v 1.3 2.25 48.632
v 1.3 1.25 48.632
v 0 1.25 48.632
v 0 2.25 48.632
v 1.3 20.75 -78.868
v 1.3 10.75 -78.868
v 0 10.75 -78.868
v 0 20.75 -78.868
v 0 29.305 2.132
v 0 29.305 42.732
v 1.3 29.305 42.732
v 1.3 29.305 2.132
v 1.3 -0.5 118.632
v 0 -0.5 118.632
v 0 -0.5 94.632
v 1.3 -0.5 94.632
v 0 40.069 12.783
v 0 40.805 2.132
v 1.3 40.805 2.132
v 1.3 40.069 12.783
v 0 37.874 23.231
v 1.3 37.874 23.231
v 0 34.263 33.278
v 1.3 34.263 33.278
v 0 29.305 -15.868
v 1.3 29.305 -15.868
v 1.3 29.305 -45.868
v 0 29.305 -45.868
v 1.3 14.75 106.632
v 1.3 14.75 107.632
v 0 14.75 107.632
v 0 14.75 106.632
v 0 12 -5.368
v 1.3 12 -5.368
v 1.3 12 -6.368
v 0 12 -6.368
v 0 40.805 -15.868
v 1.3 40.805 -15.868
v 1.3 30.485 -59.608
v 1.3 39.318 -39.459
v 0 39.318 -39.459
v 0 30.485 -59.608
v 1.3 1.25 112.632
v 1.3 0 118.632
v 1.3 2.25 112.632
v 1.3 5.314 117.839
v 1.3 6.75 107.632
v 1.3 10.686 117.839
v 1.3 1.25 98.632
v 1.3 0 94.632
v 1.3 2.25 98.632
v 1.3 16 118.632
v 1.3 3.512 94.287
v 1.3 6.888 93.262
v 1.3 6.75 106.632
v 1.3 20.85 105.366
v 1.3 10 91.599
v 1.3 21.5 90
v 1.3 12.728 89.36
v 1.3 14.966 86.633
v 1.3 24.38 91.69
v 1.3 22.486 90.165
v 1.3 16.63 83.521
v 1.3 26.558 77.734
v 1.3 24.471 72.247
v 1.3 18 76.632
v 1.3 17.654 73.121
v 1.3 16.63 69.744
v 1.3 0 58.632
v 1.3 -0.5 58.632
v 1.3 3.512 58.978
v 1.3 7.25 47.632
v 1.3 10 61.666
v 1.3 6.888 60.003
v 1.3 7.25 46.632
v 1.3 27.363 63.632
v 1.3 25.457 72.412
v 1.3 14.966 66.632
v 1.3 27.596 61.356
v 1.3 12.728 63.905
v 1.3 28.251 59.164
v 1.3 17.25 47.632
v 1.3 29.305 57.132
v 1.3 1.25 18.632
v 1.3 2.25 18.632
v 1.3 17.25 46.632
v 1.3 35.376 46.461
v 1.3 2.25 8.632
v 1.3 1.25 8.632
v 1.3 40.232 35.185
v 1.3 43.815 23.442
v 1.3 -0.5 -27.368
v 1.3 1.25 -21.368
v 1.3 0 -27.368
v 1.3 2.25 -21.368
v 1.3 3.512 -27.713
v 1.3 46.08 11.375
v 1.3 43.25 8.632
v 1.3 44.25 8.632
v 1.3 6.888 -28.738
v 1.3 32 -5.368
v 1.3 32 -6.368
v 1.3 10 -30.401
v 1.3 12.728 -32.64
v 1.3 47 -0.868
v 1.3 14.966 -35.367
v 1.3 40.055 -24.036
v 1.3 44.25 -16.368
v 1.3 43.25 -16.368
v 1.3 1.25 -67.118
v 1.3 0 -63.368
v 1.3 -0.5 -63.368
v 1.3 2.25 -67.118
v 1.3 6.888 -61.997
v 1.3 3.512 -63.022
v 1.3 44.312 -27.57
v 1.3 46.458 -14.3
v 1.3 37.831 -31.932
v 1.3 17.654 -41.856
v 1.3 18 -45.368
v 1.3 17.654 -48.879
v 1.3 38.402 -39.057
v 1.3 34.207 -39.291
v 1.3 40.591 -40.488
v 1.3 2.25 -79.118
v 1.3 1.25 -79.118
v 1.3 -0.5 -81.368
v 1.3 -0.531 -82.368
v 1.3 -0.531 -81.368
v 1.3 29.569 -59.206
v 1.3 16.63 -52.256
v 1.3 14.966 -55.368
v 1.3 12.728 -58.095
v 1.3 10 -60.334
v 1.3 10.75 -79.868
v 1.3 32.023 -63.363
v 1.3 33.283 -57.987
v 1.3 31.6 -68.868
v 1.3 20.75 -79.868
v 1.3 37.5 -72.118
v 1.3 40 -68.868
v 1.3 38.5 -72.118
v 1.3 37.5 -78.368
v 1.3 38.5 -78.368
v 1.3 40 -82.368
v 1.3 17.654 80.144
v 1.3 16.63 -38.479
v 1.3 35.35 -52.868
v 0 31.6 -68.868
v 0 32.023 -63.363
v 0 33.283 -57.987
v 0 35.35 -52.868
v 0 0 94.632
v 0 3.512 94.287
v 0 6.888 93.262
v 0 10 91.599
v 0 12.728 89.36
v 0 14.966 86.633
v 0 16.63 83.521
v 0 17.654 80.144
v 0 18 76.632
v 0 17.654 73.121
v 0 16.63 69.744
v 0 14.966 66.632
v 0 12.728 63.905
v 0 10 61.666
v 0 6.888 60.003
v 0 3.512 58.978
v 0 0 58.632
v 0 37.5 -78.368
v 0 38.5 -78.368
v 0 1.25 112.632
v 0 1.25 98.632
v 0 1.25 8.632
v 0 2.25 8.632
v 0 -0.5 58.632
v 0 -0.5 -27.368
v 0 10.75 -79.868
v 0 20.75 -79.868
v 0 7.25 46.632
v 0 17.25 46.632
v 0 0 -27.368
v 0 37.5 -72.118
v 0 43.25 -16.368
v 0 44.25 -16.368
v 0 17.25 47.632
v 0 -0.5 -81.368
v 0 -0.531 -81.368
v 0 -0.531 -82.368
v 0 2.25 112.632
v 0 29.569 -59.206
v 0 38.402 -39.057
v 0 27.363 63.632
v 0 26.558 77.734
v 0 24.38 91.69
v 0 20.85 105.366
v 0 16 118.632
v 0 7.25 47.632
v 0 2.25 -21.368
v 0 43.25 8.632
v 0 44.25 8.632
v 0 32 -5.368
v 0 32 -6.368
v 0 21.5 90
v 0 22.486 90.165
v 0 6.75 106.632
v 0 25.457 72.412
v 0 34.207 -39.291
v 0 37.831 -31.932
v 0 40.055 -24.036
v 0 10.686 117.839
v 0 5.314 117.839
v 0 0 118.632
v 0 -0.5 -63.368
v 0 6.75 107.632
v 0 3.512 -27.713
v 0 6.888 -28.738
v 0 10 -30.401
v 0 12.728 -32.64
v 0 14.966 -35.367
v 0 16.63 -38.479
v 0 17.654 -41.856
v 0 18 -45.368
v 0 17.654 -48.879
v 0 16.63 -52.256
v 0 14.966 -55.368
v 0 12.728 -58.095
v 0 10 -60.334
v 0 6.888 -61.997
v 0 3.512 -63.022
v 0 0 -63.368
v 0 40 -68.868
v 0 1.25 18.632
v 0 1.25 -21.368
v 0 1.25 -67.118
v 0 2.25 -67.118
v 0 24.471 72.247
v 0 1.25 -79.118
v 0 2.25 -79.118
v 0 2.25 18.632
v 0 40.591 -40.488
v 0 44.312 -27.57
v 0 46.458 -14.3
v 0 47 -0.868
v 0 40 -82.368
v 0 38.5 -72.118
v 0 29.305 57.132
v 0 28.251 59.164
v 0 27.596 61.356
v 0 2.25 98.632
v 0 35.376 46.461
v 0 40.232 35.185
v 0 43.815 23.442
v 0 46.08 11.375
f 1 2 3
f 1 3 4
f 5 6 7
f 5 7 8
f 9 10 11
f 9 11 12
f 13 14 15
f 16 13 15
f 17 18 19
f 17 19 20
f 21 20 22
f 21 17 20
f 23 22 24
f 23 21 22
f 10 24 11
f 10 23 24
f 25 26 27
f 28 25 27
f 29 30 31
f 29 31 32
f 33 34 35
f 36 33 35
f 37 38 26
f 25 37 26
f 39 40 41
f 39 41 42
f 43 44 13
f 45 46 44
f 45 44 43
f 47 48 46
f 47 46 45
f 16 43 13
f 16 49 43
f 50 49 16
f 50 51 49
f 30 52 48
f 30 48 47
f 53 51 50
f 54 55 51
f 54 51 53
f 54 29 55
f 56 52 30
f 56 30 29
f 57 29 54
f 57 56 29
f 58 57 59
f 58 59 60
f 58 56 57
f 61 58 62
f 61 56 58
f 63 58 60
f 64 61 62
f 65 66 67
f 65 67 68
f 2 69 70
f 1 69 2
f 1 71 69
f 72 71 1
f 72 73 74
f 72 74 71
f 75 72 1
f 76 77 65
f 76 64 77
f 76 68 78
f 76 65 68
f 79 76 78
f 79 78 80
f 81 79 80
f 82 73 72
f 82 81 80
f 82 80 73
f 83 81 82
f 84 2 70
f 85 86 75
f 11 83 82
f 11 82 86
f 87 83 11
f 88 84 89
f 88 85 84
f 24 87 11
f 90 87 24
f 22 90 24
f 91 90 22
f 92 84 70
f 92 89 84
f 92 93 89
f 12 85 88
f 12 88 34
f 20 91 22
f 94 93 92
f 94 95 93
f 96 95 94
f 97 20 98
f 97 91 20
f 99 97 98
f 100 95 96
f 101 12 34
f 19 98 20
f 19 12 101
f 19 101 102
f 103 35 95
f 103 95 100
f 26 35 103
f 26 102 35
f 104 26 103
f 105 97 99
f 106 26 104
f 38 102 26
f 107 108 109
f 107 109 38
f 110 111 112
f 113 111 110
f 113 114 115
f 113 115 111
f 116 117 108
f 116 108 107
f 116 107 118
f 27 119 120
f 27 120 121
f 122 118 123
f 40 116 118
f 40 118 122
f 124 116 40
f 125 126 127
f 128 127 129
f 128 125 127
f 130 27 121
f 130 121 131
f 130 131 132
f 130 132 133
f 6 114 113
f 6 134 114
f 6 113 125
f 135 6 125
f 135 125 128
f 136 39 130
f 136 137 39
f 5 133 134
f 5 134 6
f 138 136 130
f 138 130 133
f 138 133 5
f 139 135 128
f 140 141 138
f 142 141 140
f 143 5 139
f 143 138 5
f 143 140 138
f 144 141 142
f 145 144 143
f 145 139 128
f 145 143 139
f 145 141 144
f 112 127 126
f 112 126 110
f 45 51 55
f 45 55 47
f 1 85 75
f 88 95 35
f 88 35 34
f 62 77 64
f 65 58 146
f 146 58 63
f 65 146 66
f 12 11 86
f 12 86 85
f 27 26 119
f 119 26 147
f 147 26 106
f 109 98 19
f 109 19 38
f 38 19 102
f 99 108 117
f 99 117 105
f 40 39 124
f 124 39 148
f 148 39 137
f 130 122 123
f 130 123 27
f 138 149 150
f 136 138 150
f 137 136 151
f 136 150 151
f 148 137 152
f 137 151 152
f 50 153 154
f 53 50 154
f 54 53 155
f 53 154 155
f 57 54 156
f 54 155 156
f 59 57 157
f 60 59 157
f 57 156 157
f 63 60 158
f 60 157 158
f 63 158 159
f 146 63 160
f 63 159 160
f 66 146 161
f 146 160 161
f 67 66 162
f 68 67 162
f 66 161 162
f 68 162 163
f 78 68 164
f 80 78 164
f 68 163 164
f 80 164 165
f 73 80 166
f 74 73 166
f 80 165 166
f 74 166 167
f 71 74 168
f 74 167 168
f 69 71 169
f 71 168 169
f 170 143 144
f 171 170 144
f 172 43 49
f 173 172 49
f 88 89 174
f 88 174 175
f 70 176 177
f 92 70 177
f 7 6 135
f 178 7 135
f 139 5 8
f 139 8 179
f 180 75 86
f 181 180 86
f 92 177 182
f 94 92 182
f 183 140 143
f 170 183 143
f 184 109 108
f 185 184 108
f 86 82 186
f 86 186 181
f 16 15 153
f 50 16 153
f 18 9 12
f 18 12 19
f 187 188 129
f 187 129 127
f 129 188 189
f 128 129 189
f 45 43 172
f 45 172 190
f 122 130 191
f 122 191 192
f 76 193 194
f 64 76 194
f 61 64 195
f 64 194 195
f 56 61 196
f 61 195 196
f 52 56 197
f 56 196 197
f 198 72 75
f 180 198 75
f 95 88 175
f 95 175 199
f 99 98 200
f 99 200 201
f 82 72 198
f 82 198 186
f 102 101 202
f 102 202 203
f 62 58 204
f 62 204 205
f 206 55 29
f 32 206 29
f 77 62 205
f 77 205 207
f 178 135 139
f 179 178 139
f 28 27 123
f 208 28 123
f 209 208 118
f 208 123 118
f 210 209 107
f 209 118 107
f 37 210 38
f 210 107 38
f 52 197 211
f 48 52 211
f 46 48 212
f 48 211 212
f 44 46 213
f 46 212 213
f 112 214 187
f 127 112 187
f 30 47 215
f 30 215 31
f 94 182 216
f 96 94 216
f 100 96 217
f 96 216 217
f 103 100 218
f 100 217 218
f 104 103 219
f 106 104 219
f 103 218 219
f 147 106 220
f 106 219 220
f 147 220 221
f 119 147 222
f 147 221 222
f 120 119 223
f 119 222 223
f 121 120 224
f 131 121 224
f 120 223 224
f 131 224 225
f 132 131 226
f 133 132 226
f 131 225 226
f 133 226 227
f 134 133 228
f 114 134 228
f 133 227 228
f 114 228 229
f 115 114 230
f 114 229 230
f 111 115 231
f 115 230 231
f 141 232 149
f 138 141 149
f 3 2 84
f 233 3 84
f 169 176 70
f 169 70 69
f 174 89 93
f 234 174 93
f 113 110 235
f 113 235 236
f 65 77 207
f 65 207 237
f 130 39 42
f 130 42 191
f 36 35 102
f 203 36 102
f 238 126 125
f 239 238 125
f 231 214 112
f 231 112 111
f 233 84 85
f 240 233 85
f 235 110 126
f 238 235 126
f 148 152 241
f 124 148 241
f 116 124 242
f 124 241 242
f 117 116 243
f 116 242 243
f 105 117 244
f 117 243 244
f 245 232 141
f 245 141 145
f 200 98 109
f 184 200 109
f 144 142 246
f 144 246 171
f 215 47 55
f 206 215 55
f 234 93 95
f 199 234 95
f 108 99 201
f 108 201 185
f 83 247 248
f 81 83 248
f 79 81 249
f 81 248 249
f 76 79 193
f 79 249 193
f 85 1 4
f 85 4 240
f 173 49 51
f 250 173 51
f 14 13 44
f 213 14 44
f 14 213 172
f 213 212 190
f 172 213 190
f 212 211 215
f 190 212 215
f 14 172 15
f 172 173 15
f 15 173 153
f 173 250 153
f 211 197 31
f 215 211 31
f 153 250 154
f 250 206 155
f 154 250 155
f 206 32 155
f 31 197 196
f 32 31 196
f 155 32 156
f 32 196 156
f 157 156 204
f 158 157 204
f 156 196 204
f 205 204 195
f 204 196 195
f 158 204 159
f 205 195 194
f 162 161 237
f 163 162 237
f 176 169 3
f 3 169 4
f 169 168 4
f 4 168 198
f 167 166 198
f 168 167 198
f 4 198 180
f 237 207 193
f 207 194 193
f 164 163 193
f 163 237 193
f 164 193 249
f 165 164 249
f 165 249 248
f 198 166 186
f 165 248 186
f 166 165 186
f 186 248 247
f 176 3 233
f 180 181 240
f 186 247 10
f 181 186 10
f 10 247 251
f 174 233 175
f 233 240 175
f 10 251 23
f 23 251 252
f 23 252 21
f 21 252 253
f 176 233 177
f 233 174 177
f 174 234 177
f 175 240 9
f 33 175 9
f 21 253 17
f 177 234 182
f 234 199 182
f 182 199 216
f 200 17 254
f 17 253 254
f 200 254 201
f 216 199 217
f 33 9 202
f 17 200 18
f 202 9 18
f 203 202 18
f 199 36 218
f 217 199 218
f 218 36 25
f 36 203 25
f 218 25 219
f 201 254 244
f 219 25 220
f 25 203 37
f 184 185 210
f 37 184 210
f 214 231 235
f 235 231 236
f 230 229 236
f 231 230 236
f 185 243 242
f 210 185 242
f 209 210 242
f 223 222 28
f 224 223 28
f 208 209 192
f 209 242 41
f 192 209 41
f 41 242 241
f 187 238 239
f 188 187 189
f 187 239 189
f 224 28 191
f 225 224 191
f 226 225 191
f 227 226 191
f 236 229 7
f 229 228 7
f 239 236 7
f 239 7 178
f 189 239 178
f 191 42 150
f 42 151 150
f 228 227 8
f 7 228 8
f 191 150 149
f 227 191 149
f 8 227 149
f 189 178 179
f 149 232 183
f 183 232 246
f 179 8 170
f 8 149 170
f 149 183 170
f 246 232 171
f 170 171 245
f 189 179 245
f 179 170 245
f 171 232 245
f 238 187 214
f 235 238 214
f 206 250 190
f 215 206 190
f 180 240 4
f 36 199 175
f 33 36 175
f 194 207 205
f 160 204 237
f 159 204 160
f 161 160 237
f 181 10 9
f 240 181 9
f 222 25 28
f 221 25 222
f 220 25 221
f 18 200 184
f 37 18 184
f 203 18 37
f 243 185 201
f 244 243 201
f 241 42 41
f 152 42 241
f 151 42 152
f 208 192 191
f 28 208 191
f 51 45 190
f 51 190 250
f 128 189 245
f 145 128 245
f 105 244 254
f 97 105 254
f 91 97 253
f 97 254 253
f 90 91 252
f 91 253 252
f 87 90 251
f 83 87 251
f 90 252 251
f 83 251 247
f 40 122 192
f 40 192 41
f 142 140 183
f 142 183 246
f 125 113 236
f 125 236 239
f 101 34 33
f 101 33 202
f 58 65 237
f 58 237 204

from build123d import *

# Parameters (mm, degrees)
BOSS_EXTRUDE1_DEPTH = 1.3
SKETCH2_W           = 6.25
SKETCH2_H           = 1
CUT_EXTRUDE1_DEPTH  = 128.618193671
SKETCH3_W           = 12
SKETCH3_H           = 1
SKETCH3_W_2         = 30
SKETCH3_W_3         = 14
SKETCH3_W_4         = 1
SKETCH3_H_2         = 8
CUT_EXTRUDE2_DEPTH  = 128.618193671
SKETCH4_W           = 1
SKETCH4_H           = 10
CUT_EXTRUDE3_DEPTH  = 128.618193671
SKETCH5_W           = 25
SKETCH5_H           = 1
SKETCH5_W_2         = 1
SKETCH5_H_2         = 20
CUT_EXTRUDE4_DEPTH  = 128.618193671
SKETCH6_W           = 1
SKETCH6_H           = 10
CUT_EXTRUDE5_DEPTH  = 128.618193671
SKETCH7_W           = 24
SKETCH7_H           = 0.5
SKETCH7_W_2         = 86
SKETCH7_W_3         = 18
BOSS_EXTRUDE2_DEPTH = 1.3
CUT_EXTRUDE6_DEPTH  = 128.618193671
SKETCH10_W          = 1
SKETCH10_H          = 40.53071679
BOSS_EXTRUDE3_DEPTH = 1.3


with BuildPart() as part:
    # Sketch1 → Boss-Extrude1 (new body)
    with BuildSketch(Plane(origin=(0, 0, 0), x_dir=(0, 0, -1), z_dir=(1, 0, 0))):
        with BuildLine():
            Line((81.367510562, 0), (81.367510562, 40))
            Line((81.367510562, 40), (68.86751224, 40))
            Line((68.86751224, 40), (68.86751224, 31.6))
            ThreePointArc((68.86751224, 31.6), (60.650673838, 32.5501447), (52.86751224, 35.350431081))
            ThreePointArc((52.86751224, 35.350431081), (27.570153703, 44.311585339), (0.86751224, 47))
            ThreePointArc((0.86751224, 47), (-29.363130095, 42.186071485), (-57.13248776, 29.304750955))
            ThreePointArc((-57.13248776, 29.304750955), (-60.244560512, 27.872141345), (-63.63248776, 27.362910487))
            ThreePointArc((-63.63248776, 27.362910487), (-91.690071427, 24.380332585), (-118.63248776, 16))
            ThreePointArc((-118.63248776, 16), (-117.739294054, 7.999999906), (-118.632489438, 0))
            Line((-118.632489438, 0), (-94.632489438, 0))
            ThreePointArc((-94.632489438, 0), (-76.632489438, 18), (-58.632489438, 0))
            Line((-58.632489438, 0), (27.367510562, 0))
            ThreePointArc((27.367510562, 0), (45.367510562, 18), (63.367510562, 0))
            Line((63.367510562, 0), (81.367510562, 0))
        make_face()
        with BuildLine():
            Line((-42.73248776, 29.304750955), (-2.13248776, 29.304750955))
            Line((-2.13248776, 29.304750955), (-2.13248776, 40.804750955))
            ThreePointArc((-2.13248776, 40.804750955), (-23.231125157, 37.874288199), (-42.73248776, 29.304750955))
        make_face(mode=Mode.SUBTRACT)
    extrude(amount=BOSS_EXTRUDE1_DEPTH)

    # Sketch2 → Cut-Extrude1 (cut, through all)
    with BuildSketch(Plane(origin=(1.3, 0, 0), x_dir=(0, 0, -1), z_dir=(1, 0, 0))):
        with Locations((75.242510562, 38)):
            Rectangle(SKETCH2_W, SKETCH2_H)
    extrude(amount=-CUT_EXTRUDE1_DEPTH, mode=Mode.SUBTRACT)

    # Sketch3 → Cut-Extrude2 (cut, through all)
    with BuildSketch(Plane(origin=(1.3, 0, 0), x_dir=(0, 0, -1), z_dir=(1, 0, 0))):
        with Locations((73.117510562, 1.75)):
            Rectangle(SKETCH3_W, SKETCH3_H)
        with Locations((6.367510562, 1.75)):
            Rectangle(SKETCH3_W_2, SKETCH3_H)
        with Locations((-105.632489438, 1.75)):
            Rectangle(SKETCH3_W_3, SKETCH3_H)
        Polygon((-90.165047606, 22.486285602), (-72.411906778, 25.457142507), (-72.246859172, 24.470856905), (-90, 21.5), align=None)
        with Locations((-107.132489438, 10.75)):
            Rectangle(SKETCH3_W_4, SKETCH3_H_2)
        Polygon((39.458953443, 39.317791271), (59.607847956, 30.484782164), (59.206347542, 29.568923322), (39.057453029, 38.40193243), align=None)
        with Locations((-33.632489438, 1.75)):
            Rectangle(SKETCH3_W_2, SKETCH3_H)
    extrude(amount=-CUT_EXTRUDE2_DEPTH, mode=Mode.SUBTRACT)

    # Sketch4 → Cut-Extrude3 (cut, through all)
    with BuildSketch(Plane(origin=(1.3, 0, 0), x_dir=(0, 0, -1), z_dir=(1, 0, 0))):
        with Locations((79.367510562, 15.75)):
            Rectangle(SKETCH4_W, SKETCH4_H)
    extrude(amount=-CUT_EXTRUDE3_DEPTH, mode=Mode.SUBTRACT)

    # Sketch5 → Cut-Extrude4 (cut, through all)
    with BuildSketch(Plane(origin=(1.3, 0, 0), x_dir=(0, 0, -1), z_dir=(1, 0, 0))):
        with Locations((3.867510562, 43.75)):
            Rectangle(SKETCH5_W, SKETCH5_H)
        with Locations((5.867510562, 22)):
            Rectangle(SKETCH5_W_2, SKETCH5_H_2)
    extrude(amount=-CUT_EXTRUDE4_DEPTH, mode=Mode.SUBTRACT)

    # Sketch6 → Cut-Extrude5 (cut, through all)
    with BuildSketch(Plane(origin=(1.3, 0, 0), x_dir=(0, 0, -1), z_dir=(1, 0, 0))):
        with Locations((-47.132489438, 12.25)):
            Rectangle(SKETCH6_W, SKETCH6_H)
    extrude(amount=-CUT_EXTRUDE5_DEPTH, mode=Mode.SUBTRACT)

    # Sketch7 → Boss-Extrude2 (add)
    with BuildSketch(Plane(origin=(0, 0, 0), x_dir=(0, 0, -1), z_dir=(1, 0, 0))):
        with Locations((-106.632489438, -0.25)):
            Rectangle(SKETCH7_W, SKETCH7_H)
        with Locations((-15.632489438, -0.25)):
            Rectangle(SKETCH7_W_2, SKETCH7_H)
        with Locations((72.367510562, -0.25)):
            Rectangle(SKETCH7_W_3, SKETCH7_H)
    extrude(amount=BOSS_EXTRUDE2_DEPTH)

    # Sketch9 → Cut-Extrude6 (cut, through all)
    with BuildSketch(Plane(origin=(1.3, 0, 0), x_dir=(0, 0, -1), z_dir=(1, 0, 0))):
        with BuildLine():
            Line((15.86751224, 40.804750955), (15.86751224, 29.304750955))
            Line((15.86751224, 29.304750955), (45.86751224, 29.304750955))
            ThreePointArc((45.86751224, 29.304750955), (31.931836066, 37.831247893), (15.86751224, 40.804750955))
        make_face()
    extrude(amount=-CUT_EXTRUDE6_DEPTH, mode=Mode.SUBTRACT)

    # Sketch10 → Boss-Extrude3 (add)
    with BuildSketch(Plane(origin=(0, 0, 0), x_dir=(0, 0, -1), z_dir=(1, 0, 0))):
        with Locations((81.867510562, 19.734641605)):
            Rectangle(SKETCH10_W, SKETCH10_H)
    extrude(amount=BOSS_EXTRUDE3_DEPTH)


solid = part.part
